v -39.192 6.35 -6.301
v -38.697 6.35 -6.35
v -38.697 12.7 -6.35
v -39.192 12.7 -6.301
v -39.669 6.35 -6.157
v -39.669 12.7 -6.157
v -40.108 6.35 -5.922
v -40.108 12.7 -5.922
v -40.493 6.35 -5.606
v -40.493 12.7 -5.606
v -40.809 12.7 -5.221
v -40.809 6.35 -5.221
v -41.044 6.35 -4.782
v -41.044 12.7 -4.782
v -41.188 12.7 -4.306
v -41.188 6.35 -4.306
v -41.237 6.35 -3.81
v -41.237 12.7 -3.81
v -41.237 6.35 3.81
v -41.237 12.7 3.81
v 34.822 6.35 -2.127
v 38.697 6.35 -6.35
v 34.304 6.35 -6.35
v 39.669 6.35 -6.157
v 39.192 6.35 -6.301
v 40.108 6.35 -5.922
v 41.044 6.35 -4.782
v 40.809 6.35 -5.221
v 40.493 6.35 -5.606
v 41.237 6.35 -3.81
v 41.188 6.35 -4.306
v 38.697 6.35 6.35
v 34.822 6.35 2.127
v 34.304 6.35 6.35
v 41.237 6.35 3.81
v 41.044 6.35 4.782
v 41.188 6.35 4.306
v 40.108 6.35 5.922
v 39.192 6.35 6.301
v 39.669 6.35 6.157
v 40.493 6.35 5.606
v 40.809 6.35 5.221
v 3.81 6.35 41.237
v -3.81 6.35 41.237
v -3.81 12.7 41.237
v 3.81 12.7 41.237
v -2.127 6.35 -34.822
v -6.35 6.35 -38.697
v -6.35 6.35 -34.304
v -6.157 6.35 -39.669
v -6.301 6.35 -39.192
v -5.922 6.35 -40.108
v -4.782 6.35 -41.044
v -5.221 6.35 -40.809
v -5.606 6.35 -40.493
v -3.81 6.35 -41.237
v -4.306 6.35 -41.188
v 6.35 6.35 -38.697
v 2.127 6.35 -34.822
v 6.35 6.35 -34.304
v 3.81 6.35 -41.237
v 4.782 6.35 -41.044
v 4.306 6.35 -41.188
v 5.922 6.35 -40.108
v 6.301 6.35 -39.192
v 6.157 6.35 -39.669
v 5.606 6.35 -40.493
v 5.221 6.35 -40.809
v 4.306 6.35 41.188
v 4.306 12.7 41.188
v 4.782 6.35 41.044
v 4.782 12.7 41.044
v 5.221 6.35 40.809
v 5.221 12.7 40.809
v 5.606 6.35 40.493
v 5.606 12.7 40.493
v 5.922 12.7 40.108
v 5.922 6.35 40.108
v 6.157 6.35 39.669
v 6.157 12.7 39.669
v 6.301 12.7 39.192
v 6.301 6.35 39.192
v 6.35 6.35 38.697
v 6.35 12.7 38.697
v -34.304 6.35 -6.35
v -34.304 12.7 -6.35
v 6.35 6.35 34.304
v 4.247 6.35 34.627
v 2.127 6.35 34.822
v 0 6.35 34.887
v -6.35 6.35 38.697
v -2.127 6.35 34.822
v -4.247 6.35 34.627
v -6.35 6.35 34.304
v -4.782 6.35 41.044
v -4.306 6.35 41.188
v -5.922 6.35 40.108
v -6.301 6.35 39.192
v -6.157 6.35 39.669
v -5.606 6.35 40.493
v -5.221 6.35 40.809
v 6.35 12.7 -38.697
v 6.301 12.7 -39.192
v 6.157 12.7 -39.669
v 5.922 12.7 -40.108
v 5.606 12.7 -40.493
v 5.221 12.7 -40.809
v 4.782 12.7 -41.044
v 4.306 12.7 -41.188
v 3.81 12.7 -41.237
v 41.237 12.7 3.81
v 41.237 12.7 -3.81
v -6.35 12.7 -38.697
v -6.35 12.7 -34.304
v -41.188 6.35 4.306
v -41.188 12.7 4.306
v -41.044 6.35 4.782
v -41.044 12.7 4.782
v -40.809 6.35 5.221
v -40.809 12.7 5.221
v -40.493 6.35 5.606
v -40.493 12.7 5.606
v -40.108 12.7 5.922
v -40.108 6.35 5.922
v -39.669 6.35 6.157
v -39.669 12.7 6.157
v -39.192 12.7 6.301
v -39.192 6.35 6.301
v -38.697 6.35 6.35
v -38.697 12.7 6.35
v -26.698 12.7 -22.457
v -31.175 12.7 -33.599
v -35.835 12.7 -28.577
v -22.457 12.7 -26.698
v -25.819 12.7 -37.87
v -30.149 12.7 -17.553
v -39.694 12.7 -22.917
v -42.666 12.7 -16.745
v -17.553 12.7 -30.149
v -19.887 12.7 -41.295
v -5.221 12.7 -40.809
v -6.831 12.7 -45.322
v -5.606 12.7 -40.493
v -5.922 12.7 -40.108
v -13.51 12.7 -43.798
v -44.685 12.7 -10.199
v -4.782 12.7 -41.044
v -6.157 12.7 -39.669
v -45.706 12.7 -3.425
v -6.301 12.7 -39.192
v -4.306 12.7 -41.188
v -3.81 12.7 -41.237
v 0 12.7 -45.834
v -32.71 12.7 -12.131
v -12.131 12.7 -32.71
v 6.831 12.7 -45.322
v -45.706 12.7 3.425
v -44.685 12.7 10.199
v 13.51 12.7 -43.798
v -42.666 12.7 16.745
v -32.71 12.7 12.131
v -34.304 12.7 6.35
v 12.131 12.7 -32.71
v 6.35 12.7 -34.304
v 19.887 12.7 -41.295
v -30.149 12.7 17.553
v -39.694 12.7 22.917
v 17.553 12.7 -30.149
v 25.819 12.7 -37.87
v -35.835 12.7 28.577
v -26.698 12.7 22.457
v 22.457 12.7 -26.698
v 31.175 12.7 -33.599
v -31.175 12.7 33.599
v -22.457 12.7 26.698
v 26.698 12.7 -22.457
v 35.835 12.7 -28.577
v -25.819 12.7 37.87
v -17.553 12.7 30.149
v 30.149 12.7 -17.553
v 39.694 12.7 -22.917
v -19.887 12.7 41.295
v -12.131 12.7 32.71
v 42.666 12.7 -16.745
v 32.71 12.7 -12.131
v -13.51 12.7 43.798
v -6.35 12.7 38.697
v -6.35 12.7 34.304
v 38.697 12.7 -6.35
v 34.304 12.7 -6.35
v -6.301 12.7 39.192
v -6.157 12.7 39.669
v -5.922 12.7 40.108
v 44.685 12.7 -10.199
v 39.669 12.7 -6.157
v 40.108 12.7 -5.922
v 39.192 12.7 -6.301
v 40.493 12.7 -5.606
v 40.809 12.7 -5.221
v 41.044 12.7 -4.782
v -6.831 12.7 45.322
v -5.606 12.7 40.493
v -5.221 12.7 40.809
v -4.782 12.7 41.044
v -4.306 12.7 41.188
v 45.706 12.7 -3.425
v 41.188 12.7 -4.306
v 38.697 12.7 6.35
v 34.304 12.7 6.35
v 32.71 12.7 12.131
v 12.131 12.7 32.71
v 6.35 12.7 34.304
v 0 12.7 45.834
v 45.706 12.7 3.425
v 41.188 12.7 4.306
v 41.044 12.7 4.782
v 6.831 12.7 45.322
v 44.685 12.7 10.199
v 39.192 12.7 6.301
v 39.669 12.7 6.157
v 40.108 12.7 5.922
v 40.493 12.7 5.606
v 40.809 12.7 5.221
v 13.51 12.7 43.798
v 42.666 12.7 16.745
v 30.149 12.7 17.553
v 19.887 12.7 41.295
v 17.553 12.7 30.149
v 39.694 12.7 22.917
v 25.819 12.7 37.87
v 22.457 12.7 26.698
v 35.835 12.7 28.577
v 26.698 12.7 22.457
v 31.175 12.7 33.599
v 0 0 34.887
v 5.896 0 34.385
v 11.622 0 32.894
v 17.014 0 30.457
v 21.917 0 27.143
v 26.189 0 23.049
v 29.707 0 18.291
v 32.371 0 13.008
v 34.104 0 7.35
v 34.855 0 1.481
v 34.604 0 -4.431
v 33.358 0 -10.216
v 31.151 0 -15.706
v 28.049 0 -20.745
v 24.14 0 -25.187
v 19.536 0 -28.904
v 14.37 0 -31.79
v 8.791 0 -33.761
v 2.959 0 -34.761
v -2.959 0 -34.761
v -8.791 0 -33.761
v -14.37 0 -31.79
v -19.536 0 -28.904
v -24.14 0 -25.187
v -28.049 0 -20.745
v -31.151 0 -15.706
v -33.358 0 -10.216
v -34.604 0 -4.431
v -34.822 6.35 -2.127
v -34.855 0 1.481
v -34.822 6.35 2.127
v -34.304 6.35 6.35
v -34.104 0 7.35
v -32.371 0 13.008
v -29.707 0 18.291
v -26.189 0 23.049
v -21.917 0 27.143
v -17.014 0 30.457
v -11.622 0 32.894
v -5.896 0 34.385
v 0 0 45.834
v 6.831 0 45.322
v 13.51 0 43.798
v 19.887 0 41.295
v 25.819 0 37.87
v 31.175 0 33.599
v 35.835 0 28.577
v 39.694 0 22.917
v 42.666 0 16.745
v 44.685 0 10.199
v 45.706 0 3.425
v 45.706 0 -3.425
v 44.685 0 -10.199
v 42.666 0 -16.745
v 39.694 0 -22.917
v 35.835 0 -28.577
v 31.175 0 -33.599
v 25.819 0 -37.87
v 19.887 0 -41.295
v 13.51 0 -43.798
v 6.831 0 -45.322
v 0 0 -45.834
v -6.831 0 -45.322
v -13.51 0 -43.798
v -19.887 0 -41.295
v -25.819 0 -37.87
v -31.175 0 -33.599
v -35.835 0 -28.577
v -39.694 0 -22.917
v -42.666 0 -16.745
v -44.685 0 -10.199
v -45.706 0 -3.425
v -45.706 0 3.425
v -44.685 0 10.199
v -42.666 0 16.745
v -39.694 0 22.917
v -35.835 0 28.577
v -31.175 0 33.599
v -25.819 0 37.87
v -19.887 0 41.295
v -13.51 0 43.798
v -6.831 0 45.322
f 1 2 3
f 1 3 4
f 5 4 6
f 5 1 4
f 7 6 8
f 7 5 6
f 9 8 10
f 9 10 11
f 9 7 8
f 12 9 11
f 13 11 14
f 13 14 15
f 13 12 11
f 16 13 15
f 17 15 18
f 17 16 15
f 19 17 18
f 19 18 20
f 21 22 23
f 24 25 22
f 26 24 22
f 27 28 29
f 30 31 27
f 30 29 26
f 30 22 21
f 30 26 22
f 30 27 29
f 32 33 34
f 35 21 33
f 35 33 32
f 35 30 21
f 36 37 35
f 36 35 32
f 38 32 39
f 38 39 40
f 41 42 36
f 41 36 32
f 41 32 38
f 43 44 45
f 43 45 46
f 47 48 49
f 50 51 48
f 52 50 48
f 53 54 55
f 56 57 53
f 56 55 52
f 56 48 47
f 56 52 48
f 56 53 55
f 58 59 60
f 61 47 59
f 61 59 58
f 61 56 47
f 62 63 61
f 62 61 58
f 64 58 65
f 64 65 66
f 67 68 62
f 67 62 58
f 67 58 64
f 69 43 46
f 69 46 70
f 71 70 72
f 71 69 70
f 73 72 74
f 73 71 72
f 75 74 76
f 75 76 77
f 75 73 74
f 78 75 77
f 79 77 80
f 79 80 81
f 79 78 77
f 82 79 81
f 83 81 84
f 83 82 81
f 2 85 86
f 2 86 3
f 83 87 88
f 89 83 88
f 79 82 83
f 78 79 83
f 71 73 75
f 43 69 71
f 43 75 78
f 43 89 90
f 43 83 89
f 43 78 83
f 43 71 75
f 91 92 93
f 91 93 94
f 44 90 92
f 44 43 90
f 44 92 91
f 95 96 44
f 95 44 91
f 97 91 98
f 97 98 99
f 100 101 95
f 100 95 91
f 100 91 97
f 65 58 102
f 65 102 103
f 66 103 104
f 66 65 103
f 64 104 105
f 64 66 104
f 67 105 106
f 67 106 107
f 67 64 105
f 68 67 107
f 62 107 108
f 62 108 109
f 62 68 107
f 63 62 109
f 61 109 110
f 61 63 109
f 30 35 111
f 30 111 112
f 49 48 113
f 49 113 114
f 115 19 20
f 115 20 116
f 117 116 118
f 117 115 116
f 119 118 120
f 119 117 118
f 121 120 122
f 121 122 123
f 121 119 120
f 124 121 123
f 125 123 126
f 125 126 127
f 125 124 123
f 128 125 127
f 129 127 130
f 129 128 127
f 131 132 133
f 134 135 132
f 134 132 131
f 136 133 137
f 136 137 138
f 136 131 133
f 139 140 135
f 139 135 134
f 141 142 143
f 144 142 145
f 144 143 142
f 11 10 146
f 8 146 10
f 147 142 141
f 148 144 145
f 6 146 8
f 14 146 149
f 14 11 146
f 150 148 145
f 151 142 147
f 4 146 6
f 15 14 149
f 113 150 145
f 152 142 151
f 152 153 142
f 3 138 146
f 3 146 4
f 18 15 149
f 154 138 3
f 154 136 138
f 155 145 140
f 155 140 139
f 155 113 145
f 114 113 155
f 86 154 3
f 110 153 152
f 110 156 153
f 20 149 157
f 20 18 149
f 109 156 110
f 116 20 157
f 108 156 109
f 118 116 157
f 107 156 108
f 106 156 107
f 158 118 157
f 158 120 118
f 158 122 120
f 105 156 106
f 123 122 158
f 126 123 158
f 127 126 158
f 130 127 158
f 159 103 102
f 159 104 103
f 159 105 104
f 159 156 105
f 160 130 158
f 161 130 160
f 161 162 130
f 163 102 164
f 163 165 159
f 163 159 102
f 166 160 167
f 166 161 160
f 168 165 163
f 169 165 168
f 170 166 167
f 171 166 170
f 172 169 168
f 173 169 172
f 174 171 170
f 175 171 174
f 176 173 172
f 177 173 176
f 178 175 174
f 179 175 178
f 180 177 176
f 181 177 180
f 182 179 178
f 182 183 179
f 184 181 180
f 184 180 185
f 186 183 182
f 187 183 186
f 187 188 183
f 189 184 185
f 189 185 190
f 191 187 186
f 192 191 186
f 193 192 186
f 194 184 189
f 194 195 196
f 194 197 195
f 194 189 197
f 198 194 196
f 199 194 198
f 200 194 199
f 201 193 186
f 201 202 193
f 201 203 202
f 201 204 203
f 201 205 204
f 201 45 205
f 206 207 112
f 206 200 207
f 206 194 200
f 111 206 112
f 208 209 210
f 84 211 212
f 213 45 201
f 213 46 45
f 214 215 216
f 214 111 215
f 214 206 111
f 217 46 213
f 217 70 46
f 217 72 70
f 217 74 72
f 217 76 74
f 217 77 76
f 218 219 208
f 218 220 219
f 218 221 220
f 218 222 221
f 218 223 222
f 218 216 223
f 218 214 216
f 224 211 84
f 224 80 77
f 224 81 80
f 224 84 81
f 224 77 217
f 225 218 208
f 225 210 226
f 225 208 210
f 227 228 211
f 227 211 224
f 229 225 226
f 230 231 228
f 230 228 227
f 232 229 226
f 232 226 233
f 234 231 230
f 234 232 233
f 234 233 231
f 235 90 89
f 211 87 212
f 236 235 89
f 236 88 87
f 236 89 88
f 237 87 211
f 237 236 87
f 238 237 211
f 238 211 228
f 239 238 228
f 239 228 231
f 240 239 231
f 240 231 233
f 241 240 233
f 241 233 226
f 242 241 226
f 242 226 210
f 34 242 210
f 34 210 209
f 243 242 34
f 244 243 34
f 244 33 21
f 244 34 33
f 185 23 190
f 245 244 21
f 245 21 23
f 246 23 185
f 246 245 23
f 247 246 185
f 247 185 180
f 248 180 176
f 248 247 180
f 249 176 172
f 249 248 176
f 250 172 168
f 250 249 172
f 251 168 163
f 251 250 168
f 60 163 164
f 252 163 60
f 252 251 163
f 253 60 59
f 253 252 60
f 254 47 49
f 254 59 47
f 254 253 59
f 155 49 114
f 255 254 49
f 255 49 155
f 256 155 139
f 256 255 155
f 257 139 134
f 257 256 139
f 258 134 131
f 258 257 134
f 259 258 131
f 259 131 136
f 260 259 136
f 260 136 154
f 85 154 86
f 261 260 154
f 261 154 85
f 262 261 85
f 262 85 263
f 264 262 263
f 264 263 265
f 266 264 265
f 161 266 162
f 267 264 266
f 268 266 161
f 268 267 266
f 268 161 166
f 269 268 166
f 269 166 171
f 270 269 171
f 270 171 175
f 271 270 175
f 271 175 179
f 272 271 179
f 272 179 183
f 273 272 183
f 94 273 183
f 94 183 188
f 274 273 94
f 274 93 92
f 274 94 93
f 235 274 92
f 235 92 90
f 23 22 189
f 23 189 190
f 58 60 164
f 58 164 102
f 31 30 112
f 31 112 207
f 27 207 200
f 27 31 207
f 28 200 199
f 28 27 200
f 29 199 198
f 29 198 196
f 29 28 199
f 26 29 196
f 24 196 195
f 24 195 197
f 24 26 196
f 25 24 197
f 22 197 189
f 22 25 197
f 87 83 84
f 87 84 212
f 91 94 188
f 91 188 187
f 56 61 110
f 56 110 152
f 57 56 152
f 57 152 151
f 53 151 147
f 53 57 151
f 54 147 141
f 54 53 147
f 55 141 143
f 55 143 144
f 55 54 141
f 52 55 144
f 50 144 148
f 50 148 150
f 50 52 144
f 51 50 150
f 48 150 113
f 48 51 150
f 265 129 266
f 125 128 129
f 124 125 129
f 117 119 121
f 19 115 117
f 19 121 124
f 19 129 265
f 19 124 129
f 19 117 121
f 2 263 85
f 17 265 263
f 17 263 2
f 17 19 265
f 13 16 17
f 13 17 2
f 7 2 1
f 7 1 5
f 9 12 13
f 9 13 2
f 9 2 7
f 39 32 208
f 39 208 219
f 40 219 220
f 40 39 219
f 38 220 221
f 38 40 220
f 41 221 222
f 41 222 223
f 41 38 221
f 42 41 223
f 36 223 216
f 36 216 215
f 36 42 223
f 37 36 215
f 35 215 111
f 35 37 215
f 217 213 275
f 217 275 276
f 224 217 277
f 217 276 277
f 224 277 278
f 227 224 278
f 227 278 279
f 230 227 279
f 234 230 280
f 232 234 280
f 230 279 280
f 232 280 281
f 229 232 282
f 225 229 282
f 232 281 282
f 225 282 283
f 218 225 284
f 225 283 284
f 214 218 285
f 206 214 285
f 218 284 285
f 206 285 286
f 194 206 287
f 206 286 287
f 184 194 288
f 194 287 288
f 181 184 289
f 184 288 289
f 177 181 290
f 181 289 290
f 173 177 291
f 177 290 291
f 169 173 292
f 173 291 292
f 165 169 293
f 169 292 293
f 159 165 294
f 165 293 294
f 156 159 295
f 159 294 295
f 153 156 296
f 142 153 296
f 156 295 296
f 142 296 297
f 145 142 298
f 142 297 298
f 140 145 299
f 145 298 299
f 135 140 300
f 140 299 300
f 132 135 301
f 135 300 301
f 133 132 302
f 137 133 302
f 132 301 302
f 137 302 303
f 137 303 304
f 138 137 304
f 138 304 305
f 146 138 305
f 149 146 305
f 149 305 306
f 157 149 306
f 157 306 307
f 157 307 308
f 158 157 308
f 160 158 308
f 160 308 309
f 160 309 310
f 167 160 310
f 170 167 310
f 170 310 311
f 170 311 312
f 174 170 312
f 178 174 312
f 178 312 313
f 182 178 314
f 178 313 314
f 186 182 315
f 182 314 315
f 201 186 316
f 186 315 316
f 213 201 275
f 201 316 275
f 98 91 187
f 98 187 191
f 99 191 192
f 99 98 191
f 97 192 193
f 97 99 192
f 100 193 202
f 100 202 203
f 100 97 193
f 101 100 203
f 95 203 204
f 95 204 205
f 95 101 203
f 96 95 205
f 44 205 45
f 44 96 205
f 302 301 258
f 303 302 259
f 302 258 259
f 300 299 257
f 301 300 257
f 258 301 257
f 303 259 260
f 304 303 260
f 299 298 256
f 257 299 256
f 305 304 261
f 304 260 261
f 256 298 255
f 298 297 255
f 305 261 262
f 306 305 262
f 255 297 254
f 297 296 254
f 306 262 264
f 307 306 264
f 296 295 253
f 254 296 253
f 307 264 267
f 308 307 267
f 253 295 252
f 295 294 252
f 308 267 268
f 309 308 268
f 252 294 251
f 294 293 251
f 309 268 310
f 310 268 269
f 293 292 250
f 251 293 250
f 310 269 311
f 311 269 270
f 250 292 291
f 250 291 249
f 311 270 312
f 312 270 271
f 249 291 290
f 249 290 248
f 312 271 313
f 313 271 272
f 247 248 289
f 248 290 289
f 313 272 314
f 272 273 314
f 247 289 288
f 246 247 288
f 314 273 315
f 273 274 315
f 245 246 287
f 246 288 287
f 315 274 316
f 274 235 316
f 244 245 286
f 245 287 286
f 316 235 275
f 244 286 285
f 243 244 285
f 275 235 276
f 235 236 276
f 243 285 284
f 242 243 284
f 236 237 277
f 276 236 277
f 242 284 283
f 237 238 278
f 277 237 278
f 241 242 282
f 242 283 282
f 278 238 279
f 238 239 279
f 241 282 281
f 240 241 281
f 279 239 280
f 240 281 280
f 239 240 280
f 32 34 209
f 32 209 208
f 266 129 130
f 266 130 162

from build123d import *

# Parameters (mm, degrees)
SKETCH1_R           = 45.8343
SKETCH1_R_2         = 34.8869
BOSS_EXTRUDE1_DEPTH = 12.7
CUT_EXTRUDE1_START  = -6.35
CUT_EXTRUDE1_DEPTH  = 6.35
CIRPATTERN1_COUNT   = 4


with BuildPart() as part:
    # Sketch1 → Boss-Extrude1 (new body)
    with BuildSketch(Plane(origin=(0, 0, 0), x_dir=(1, 0, 0), z_dir=(0, 1, 0))):
        with Locations(Location((0, 0, 0), (0, 0, 270))):
            Circle(SKETCH1_R)
        with Locations(Location((0, 0, 0), (0, 0, 270))):
            Circle(SKETCH1_R_2, mode=Mode.SUBTRACT)
    extrude(amount=BOSS_EXTRUDE1_DEPTH)

    # Sketch2 → Cut-Extrude1 (cut)
    with BuildSketch(Plane(origin=(0, 12.7, 0), x_dir=(1, 0, 0), z_dir=(0, 1, 0)).offset(CUT_EXTRUDE1_START)):
        with BuildLine():
            Line((6.35, 34.304129367), (6.35, 38.6969))
            ThreePointArc((6.35, 38.6969), (5.606051224, 40.492951224), (3.81, 41.2369))
            Line((3.81, 41.2369), (-3.81, 41.2369))
            ThreePointArc((-3.81, 41.2369), (-5.606051224, 40.492951224), (-6.35, 38.6969))
            Line((-6.35, 38.6969), (-6.35, 34.304129367))
            ThreePointArc((-6.35, 34.304129367), (0, 34.8869), (6.35, 34.304129367))
        make_face()
    cut_extrude1 = extrude(amount=CUT_EXTRUDE1_DEPTH, mode=Mode.SUBTRACT)

    # CirPattern1: Cut-Extrude1 ×4 about axis
    cirpattern1_axis = Axis((0, 0, 0), (0, 1, 0))
    for i in range(1, CIRPATTERN1_COUNT):
        add(cut_extrude1.rotate(cirpattern1_axis, i * 360 / CIRPATTERN1_COUNT), mode=Mode.SUBTRACT)


solid = part.part
